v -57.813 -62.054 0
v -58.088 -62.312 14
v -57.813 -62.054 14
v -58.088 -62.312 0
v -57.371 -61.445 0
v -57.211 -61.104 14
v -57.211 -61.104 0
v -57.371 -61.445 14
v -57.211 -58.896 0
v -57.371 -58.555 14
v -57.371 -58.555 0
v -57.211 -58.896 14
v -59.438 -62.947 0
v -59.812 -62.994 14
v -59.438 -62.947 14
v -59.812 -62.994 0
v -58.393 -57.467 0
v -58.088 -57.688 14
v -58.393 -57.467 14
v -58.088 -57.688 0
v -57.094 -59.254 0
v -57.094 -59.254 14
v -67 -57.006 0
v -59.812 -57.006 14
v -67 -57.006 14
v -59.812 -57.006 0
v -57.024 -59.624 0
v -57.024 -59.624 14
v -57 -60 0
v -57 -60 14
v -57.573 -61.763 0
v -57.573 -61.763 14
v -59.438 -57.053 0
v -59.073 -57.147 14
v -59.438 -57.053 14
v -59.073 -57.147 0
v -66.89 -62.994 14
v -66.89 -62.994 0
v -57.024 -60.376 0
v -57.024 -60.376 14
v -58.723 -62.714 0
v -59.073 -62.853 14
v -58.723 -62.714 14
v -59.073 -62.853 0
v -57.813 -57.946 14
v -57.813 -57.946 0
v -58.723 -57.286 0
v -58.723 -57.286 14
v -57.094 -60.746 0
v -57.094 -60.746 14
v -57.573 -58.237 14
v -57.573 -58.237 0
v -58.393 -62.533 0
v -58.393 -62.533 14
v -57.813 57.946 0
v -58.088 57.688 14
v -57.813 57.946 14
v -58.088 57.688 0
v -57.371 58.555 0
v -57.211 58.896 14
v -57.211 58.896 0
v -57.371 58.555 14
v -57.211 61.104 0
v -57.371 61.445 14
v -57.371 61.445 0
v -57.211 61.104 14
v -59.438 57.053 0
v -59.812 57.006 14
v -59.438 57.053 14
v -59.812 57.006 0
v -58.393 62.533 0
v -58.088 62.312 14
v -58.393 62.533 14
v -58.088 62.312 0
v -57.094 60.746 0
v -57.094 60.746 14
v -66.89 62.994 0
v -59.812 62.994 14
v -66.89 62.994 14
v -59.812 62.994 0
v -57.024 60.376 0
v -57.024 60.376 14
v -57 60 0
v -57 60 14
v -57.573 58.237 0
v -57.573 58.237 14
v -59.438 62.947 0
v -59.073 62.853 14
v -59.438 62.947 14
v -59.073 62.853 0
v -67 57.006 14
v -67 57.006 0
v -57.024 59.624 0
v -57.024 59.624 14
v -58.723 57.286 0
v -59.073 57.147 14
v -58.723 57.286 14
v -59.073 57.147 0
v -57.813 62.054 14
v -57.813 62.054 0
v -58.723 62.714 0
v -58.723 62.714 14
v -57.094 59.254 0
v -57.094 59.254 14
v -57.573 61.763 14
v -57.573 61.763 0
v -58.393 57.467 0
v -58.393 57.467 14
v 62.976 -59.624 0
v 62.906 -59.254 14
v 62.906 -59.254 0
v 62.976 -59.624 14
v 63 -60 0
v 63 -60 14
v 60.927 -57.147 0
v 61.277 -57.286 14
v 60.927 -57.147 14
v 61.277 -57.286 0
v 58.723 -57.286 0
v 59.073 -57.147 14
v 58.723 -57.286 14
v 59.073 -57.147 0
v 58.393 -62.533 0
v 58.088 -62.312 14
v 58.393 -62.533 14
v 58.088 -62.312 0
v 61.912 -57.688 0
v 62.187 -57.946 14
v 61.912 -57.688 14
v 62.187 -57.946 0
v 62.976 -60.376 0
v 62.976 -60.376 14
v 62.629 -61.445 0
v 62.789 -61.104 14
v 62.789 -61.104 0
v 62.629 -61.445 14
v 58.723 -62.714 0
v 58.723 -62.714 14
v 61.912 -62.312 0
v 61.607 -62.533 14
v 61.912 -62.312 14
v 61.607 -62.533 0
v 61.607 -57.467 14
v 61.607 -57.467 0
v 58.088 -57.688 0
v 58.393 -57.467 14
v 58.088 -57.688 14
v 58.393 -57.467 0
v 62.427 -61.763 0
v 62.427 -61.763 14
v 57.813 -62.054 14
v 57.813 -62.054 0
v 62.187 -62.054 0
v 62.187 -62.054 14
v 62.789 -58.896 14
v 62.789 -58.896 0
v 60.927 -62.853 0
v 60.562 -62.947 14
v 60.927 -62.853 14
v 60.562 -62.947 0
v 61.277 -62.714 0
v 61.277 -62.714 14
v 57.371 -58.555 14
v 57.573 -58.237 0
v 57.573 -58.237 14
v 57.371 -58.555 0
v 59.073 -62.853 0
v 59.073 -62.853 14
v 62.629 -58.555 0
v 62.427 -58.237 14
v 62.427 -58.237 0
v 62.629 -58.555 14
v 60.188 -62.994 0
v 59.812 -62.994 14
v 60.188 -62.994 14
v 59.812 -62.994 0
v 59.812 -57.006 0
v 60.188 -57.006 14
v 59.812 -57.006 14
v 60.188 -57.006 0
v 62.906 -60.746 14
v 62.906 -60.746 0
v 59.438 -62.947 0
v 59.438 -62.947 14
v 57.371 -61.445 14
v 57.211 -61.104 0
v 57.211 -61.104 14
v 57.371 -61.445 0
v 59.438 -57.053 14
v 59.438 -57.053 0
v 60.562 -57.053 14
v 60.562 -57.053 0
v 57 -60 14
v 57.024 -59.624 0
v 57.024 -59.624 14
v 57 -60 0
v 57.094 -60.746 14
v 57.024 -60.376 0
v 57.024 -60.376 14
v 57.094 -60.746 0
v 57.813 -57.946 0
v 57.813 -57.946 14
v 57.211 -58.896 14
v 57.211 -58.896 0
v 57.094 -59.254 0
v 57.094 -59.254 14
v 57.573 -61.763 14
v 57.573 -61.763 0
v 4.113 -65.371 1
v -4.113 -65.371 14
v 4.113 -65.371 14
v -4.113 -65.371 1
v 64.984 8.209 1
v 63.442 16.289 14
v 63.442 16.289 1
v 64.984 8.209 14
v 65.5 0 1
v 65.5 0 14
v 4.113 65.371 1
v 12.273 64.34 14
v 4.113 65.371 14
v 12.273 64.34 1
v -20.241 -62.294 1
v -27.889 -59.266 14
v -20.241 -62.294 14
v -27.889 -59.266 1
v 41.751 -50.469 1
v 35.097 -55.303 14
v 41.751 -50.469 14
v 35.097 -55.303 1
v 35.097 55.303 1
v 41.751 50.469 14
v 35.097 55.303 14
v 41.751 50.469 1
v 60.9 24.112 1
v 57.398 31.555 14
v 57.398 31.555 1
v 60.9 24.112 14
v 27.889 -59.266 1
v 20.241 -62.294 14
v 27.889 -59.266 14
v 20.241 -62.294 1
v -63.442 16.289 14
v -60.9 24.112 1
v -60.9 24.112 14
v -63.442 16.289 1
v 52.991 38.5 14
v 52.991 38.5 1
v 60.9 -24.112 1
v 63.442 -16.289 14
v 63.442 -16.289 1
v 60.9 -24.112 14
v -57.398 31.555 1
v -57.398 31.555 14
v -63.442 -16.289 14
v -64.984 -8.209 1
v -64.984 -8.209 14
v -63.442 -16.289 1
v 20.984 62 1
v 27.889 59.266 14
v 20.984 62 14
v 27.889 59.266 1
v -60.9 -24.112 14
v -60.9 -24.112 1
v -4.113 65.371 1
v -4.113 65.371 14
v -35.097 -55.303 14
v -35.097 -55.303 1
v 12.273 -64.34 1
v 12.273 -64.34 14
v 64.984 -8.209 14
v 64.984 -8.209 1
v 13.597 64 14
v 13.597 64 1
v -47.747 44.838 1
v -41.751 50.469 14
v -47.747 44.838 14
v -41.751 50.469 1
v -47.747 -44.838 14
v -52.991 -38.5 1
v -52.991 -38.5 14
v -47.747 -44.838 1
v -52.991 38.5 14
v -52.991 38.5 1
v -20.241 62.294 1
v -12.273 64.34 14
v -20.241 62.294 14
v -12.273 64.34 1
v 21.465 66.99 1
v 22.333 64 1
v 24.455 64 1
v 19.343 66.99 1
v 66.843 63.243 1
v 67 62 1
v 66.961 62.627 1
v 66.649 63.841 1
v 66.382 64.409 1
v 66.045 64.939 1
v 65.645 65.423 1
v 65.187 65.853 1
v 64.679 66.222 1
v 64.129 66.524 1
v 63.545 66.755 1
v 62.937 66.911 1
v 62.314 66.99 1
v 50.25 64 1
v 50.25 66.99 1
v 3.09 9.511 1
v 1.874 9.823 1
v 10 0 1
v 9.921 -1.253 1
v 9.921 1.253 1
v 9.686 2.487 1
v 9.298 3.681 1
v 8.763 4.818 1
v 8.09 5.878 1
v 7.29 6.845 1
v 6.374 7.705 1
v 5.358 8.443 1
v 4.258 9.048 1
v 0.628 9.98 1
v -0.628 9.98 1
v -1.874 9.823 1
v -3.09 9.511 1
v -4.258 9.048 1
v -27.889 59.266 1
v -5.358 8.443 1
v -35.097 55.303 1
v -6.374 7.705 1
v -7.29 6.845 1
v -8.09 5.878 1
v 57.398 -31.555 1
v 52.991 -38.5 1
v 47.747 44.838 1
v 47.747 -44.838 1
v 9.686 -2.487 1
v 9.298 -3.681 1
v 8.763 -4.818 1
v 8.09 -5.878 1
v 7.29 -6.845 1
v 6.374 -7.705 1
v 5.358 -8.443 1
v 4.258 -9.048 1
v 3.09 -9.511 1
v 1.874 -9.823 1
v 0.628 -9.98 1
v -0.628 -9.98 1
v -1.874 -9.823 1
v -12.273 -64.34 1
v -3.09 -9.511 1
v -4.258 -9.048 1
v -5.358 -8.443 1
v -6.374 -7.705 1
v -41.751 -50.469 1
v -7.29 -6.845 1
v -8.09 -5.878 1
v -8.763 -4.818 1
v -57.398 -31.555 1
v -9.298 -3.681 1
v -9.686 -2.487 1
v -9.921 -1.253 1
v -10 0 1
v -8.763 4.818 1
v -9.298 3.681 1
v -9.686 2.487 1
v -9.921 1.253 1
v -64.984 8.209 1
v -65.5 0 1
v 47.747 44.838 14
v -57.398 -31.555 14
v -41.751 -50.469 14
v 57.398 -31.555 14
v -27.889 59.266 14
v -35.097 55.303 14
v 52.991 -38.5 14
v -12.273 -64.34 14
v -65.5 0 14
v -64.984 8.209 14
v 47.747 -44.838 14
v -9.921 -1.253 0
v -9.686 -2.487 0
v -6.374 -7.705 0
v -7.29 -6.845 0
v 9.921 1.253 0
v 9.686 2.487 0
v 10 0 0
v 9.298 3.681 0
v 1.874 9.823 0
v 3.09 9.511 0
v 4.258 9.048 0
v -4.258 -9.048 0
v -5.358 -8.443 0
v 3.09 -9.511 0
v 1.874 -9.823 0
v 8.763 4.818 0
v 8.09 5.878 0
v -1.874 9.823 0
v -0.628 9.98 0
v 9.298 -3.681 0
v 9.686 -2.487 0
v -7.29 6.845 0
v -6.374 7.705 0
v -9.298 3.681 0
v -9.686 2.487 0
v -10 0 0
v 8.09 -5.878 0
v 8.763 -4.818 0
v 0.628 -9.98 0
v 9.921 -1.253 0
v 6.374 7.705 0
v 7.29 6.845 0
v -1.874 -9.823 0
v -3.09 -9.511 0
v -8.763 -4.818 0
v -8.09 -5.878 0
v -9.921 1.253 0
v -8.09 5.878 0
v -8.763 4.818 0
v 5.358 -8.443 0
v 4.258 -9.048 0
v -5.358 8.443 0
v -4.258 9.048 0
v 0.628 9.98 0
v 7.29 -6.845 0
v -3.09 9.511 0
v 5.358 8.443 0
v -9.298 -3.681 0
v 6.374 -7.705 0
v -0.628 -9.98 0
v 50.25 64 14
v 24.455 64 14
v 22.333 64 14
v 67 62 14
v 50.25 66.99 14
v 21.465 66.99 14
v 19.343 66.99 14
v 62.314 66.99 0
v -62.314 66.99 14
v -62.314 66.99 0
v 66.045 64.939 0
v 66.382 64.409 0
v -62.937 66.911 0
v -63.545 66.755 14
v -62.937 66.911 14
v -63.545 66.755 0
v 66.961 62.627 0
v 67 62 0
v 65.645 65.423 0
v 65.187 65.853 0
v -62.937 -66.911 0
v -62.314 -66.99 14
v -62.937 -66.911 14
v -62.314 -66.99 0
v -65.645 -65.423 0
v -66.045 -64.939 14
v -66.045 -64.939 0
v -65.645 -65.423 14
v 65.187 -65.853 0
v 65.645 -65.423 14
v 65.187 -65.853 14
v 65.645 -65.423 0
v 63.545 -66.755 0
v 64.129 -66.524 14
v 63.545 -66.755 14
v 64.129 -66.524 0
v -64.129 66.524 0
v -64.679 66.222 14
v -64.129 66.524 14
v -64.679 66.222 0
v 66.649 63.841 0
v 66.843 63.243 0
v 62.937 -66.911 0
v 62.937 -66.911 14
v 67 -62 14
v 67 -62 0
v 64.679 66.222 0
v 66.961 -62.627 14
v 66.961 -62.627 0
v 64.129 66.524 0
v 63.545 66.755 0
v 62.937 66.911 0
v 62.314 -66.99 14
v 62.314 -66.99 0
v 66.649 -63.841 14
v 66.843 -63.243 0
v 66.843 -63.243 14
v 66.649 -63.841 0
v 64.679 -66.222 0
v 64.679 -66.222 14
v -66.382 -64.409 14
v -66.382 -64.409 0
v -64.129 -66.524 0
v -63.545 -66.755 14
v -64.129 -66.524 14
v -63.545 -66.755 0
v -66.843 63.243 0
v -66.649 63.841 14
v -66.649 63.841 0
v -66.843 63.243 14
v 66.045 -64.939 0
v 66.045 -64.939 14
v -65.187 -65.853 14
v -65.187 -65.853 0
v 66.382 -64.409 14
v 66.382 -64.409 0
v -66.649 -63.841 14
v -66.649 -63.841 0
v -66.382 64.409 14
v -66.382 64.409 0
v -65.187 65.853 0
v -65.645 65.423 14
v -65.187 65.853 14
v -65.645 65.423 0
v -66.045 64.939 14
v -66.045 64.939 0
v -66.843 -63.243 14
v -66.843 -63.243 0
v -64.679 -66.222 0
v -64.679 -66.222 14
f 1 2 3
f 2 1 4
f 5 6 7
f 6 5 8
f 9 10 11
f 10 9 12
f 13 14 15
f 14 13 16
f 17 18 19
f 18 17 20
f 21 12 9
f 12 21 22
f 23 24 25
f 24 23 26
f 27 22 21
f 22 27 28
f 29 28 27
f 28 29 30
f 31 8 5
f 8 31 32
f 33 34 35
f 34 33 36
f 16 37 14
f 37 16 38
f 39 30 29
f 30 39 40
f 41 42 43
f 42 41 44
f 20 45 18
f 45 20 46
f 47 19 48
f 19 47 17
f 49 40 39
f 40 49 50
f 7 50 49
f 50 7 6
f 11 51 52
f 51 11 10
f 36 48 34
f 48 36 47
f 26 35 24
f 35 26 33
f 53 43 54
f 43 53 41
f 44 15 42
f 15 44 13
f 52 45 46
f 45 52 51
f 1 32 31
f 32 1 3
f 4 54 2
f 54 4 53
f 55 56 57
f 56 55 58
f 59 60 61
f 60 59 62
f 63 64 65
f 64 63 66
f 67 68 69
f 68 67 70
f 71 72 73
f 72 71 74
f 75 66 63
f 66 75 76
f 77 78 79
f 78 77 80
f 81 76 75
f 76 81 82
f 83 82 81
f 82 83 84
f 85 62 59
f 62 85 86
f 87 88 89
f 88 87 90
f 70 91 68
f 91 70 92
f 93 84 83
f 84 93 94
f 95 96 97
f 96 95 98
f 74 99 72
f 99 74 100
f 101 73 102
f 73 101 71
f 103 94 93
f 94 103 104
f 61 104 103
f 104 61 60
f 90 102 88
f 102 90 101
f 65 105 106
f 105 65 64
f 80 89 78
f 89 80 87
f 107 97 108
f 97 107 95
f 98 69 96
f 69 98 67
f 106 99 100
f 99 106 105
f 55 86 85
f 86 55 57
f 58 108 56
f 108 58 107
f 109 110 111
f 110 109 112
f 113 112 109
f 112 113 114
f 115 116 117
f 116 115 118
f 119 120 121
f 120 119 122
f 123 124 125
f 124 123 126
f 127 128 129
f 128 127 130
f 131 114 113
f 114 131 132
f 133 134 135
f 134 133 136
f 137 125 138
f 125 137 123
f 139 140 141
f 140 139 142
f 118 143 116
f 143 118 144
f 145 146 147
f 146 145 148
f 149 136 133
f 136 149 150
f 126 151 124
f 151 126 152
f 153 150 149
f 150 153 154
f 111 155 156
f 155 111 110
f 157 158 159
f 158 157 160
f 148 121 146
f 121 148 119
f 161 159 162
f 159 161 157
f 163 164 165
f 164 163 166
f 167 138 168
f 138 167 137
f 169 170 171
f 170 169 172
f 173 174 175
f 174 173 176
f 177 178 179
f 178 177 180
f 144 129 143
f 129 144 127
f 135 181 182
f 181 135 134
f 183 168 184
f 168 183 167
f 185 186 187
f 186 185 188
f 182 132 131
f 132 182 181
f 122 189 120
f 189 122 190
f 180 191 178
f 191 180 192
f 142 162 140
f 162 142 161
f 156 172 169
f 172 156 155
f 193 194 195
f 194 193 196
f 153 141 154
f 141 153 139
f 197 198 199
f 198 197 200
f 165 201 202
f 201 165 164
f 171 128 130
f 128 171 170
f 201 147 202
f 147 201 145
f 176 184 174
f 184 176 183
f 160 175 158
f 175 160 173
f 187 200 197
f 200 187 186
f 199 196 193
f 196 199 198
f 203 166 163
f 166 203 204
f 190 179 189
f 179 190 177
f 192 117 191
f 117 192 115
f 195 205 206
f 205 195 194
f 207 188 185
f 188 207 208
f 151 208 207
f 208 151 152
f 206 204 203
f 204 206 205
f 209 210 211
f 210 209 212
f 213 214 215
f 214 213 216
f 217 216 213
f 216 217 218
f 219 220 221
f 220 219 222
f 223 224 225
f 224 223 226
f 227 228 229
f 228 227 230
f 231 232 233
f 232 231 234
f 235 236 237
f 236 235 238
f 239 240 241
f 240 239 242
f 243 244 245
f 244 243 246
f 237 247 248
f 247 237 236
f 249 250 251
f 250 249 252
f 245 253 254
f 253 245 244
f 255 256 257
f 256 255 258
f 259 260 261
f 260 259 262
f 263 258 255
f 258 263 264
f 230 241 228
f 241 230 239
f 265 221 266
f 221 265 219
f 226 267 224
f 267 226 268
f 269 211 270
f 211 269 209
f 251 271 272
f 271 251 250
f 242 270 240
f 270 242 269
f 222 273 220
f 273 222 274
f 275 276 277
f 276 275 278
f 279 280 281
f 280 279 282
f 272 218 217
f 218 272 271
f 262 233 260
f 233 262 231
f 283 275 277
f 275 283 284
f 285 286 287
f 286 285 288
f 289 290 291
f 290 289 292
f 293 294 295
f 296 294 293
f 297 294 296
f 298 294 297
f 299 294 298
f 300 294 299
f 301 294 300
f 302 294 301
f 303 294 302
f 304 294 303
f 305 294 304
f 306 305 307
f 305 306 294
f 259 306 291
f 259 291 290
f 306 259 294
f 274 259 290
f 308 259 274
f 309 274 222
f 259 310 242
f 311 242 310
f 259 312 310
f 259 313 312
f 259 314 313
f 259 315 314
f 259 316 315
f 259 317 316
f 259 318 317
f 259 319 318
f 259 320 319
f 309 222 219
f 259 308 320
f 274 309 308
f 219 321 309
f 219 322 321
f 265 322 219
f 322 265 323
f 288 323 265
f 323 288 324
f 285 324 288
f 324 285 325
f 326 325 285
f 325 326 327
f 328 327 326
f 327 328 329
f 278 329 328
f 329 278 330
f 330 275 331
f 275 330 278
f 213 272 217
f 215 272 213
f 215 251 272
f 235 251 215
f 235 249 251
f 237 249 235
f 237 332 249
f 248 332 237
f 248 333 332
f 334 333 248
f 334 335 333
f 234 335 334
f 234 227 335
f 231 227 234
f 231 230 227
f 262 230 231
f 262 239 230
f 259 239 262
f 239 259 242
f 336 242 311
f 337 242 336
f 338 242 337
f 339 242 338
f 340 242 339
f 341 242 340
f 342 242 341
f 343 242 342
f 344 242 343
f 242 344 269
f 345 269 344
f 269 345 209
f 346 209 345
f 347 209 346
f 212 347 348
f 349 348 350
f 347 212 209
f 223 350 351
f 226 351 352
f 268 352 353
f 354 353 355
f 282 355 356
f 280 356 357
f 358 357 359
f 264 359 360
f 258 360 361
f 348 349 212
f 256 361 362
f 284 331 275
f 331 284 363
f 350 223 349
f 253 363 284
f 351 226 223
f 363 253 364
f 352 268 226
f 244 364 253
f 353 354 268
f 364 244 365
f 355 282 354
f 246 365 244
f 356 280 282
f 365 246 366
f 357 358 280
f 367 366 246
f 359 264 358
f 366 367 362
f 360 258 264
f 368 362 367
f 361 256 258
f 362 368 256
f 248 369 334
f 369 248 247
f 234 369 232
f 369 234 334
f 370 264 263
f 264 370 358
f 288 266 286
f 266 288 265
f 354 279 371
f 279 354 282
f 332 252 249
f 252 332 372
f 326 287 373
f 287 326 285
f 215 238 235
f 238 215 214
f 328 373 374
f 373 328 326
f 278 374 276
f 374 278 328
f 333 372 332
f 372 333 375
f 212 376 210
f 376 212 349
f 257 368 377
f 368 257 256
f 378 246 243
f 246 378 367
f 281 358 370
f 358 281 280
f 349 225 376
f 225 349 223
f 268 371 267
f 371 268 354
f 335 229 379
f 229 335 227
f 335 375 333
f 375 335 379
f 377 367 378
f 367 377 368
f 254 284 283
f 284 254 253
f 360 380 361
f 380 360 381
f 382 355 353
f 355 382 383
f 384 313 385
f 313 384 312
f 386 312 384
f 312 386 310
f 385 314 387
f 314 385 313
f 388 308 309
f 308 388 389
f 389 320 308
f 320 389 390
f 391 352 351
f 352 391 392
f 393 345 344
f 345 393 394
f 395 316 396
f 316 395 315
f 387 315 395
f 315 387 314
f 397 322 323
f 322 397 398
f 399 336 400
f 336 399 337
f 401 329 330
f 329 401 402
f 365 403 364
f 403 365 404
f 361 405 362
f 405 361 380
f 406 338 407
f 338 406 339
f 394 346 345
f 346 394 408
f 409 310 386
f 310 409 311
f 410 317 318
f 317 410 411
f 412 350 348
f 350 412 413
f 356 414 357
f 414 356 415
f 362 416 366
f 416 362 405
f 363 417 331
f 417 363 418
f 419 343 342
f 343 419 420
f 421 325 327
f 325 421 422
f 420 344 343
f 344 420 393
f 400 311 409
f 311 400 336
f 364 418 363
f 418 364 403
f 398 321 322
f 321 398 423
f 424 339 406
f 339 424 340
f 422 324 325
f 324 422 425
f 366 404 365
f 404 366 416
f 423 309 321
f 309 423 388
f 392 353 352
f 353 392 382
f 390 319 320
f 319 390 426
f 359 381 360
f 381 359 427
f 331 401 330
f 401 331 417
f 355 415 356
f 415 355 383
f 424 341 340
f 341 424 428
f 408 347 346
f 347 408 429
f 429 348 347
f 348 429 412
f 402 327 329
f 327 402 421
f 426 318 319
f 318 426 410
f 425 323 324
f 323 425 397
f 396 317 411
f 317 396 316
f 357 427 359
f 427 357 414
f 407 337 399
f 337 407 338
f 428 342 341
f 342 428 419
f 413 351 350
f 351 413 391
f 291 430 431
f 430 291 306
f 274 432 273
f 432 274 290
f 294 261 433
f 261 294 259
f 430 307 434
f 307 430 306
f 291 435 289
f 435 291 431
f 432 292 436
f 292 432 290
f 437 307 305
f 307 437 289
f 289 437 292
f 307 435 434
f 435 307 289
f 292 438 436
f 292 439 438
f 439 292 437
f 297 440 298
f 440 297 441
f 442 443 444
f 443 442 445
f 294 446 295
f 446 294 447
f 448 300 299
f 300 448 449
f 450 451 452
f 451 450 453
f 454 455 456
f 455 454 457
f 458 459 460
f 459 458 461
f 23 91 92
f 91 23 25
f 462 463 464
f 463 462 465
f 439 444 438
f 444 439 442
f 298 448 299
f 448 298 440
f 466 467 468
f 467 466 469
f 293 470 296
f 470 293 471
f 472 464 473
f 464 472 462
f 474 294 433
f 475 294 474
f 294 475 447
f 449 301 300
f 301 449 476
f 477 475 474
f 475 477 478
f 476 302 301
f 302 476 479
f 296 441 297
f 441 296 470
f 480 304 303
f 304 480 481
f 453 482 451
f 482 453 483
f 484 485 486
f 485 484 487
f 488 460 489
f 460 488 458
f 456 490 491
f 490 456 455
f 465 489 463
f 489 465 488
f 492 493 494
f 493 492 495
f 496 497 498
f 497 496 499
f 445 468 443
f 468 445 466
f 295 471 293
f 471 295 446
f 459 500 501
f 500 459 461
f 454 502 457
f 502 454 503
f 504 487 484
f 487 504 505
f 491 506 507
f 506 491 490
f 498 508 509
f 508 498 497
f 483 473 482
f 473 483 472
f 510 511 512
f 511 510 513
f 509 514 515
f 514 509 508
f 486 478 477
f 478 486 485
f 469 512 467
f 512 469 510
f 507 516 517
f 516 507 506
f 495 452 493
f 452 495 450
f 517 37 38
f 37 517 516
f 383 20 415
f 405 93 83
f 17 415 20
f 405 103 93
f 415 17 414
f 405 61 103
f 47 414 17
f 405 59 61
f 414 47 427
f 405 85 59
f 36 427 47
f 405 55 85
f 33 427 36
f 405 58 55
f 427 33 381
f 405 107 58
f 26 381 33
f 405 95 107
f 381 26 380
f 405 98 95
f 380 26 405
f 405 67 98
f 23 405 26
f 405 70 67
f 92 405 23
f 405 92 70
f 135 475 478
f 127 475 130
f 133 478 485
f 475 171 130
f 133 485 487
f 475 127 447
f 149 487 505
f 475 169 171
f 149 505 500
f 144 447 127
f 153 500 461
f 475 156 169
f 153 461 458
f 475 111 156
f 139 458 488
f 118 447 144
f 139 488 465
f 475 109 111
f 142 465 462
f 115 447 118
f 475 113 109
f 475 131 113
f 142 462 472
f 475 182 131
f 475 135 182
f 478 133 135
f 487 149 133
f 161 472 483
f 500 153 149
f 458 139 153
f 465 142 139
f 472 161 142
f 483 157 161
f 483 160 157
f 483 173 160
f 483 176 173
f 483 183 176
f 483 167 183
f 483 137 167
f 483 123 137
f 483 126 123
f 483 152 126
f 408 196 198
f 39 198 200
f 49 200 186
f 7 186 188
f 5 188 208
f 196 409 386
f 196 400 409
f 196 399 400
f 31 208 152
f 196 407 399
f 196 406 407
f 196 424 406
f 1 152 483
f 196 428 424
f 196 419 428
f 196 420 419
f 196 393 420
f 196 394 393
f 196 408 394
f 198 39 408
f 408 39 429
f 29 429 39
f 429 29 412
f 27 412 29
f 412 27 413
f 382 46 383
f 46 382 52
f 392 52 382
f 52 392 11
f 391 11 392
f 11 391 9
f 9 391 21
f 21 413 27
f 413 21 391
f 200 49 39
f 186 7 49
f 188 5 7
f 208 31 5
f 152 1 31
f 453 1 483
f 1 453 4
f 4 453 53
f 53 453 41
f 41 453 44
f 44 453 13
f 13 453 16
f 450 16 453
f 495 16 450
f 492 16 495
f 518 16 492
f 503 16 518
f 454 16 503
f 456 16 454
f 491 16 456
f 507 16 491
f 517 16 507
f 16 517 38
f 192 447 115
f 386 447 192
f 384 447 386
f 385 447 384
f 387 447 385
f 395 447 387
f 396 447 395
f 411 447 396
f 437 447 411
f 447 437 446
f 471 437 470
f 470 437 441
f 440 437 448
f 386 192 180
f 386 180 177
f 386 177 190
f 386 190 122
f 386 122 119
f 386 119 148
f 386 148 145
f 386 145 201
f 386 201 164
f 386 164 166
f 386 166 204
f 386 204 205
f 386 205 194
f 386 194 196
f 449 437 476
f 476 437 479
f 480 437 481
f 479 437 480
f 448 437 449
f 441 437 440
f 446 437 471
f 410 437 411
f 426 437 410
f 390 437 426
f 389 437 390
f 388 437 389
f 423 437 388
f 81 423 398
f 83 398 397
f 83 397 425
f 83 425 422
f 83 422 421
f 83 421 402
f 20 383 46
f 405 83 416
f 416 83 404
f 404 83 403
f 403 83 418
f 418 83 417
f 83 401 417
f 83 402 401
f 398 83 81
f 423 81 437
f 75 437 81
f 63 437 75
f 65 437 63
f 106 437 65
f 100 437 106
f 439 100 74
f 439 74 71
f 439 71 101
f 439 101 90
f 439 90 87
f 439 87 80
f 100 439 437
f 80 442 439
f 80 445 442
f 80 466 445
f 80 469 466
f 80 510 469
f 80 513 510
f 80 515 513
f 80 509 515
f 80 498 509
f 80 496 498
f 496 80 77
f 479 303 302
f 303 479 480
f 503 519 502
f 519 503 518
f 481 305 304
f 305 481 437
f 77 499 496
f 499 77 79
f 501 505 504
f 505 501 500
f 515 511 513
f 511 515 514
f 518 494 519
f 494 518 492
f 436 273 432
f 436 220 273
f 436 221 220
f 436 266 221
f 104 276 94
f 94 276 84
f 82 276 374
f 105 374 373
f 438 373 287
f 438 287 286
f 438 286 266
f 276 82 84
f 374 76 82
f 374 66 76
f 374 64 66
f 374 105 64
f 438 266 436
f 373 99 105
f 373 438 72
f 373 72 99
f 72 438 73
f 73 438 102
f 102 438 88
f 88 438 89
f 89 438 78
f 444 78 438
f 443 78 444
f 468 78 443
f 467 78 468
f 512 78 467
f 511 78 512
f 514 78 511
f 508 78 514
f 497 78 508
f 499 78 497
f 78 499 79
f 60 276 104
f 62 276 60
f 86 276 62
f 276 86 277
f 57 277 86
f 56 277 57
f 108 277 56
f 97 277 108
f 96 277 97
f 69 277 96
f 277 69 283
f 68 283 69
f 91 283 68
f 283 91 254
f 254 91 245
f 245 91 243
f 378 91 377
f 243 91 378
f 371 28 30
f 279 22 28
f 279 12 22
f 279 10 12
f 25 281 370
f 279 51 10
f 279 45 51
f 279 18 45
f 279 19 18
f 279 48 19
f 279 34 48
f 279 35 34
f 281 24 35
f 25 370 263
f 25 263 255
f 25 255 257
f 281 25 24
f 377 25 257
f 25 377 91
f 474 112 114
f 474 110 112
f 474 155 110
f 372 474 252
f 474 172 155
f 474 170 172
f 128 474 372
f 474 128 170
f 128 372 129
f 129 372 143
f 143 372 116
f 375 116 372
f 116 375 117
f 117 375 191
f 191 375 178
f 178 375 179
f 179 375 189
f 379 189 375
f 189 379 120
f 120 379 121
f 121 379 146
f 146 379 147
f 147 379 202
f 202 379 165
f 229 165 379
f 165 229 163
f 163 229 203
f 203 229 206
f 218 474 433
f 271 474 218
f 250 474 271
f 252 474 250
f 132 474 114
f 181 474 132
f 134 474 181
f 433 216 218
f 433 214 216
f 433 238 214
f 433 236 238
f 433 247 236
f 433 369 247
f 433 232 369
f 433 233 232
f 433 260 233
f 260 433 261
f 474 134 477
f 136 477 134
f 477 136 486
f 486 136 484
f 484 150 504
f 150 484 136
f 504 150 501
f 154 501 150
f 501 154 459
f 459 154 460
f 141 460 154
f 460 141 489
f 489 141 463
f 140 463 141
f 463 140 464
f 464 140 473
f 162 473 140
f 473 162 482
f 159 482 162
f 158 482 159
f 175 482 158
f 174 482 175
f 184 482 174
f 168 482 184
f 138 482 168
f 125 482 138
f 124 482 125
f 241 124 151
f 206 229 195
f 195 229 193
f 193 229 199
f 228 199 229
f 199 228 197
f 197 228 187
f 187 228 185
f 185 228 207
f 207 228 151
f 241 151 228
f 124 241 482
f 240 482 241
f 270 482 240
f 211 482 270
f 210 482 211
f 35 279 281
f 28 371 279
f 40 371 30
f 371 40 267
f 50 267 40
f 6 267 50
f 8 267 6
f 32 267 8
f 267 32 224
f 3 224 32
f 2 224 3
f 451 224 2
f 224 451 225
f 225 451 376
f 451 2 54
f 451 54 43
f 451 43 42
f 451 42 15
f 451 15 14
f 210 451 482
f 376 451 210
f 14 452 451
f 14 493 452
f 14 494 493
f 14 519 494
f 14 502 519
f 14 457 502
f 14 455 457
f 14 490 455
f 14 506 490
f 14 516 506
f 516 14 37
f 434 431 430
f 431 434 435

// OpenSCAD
$fn = 50;


difference() {
	union() {
		translate(v = [0, 0, 0]) {
			rotate(a = [0, 0, 0]) {
				hull() {
					translate(v = [-62.0000000000, 62.0000000000, 0]) {
						rotate(a = [0, 0, 0]) {
							translate(v = [0, 0, 0]) {
								rotate(a = [0, 0, 0]) {
									cylinder(h = 14, r = 5);
								}
							}
						}
					}
					translate(v = [62.0000000000, 62.0000000000, 0]) {
						rotate(a = [0, 0, 0]) {
							translate(v = [0, 0, 0]) {
								rotate(a = [0, 0, 0]) {
									cylinder(h = 14, r = 5);
								}
							}
						}
					}
					translate(v = [-62.0000000000, -62.0000000000, 0]) {
						rotate(a = [0, 0, 0]) {
							translate(v = [0, 0, 0]) {
								rotate(a = [0, 0, 0]) {
									cylinder(h = 14, r = 5);
								}
							}
						}
					}
					translate(v = [62.0000000000, -62.0000000000, 0]) {
						rotate(a = [0, 0, 0]) {
							translate(v = [0, 0, 0]) {
								rotate(a = [0, 0, 0]) {
									cylinder(h = 14, r = 5);
								}
							}
						}
					}
				}
			}
		}
	}
	union() {
		translate(v = [-67.5000000000, -60.0000000000, -125]) {
			rotate(a = [0, 0, 0]) {
				hull() {
					translate(v = [7.5000000000, 0, 0]) {
						rotate(a = [0, 0, 0]) {
							translate(v = [0, 0, 0]) {
								rotate(a = [0, 0, 0]) {
									cylinder(h = 250, r = 3.0000000000);
								}
							}
						}
					}
					translate(v = [-7.5000000000, 0, 0]) {
						rotate(a = [0, 0, 0]) {
							translate(v = [0, 0, 0]) {
								rotate(a = [0, 0, 0]) {
									cylinder(h = 250, r = 3.0000000000);
								}
							}
						}
					}
				}
			}
		}
		translate(v = [-67.5000000000, 60.0000000000, -125]) {
			rotate(a = [0, 0, 0]) {
				hull() {
					translate(v = [7.5000000000, 0, 0]) {
						rotate(a = [0, 0, 0]) {
							translate(v = [0, 0, 0]) {
								rotate(a = [0, 0, 0]) {
									cylinder(h = 250, r = 3.0000000000);
								}
							}
						}
					}
					translate(v = [-7.5000000000, 0, 0]) {
						rotate(a = [0, 0, 0]) {
							translate(v = [0, 0, 0]) {
								rotate(a = [0, 0, 0]) {
									cylinder(h = 250, r = 3.0000000000);
								}
							}
						}
					}
				}
			}
		}
		translate(v = [60.0000000000, -60.0000000000, -125.0000000000]) {
			rotate(a = [0, 0, 0]) {
				cylinder(h = 250, r = 3.0000000000);
			}
		}
		translate(v = [0, 0, 1.0000000000]) {
			rotate(a = [0, 0, 0]) {
				cylinder(h = 16, r = 65.5000000000);
			}
		}
		translate(v = [0, 0, -7.0000000000]) {
			rotate(a = [0, 0, 0]) {
				cylinder(h = 14, r = 10.0000000000);
			}
		}
		translate(v = [0.0000000000, 62.0000000000, 1]) {
			rotate(a = [0, 0, 0]) {
				cube(size = [67.0000000000, 2, 16]);
			}
		}
		translate(v = [50.2500000000, 62.0000000000, 1]) {
			rotate(a = [0, 0, 0]) {
				cube(size = [16.7500000000, 5, 16]);
			}
		}
		translate(v = [18.5833333333, 67.7500000000, 1]) {
			rotate(a = [0, 0, -45]) {
				cube(size = [7.5000000000, 1.5000000000, 16]);
			}
		}
	}
}
